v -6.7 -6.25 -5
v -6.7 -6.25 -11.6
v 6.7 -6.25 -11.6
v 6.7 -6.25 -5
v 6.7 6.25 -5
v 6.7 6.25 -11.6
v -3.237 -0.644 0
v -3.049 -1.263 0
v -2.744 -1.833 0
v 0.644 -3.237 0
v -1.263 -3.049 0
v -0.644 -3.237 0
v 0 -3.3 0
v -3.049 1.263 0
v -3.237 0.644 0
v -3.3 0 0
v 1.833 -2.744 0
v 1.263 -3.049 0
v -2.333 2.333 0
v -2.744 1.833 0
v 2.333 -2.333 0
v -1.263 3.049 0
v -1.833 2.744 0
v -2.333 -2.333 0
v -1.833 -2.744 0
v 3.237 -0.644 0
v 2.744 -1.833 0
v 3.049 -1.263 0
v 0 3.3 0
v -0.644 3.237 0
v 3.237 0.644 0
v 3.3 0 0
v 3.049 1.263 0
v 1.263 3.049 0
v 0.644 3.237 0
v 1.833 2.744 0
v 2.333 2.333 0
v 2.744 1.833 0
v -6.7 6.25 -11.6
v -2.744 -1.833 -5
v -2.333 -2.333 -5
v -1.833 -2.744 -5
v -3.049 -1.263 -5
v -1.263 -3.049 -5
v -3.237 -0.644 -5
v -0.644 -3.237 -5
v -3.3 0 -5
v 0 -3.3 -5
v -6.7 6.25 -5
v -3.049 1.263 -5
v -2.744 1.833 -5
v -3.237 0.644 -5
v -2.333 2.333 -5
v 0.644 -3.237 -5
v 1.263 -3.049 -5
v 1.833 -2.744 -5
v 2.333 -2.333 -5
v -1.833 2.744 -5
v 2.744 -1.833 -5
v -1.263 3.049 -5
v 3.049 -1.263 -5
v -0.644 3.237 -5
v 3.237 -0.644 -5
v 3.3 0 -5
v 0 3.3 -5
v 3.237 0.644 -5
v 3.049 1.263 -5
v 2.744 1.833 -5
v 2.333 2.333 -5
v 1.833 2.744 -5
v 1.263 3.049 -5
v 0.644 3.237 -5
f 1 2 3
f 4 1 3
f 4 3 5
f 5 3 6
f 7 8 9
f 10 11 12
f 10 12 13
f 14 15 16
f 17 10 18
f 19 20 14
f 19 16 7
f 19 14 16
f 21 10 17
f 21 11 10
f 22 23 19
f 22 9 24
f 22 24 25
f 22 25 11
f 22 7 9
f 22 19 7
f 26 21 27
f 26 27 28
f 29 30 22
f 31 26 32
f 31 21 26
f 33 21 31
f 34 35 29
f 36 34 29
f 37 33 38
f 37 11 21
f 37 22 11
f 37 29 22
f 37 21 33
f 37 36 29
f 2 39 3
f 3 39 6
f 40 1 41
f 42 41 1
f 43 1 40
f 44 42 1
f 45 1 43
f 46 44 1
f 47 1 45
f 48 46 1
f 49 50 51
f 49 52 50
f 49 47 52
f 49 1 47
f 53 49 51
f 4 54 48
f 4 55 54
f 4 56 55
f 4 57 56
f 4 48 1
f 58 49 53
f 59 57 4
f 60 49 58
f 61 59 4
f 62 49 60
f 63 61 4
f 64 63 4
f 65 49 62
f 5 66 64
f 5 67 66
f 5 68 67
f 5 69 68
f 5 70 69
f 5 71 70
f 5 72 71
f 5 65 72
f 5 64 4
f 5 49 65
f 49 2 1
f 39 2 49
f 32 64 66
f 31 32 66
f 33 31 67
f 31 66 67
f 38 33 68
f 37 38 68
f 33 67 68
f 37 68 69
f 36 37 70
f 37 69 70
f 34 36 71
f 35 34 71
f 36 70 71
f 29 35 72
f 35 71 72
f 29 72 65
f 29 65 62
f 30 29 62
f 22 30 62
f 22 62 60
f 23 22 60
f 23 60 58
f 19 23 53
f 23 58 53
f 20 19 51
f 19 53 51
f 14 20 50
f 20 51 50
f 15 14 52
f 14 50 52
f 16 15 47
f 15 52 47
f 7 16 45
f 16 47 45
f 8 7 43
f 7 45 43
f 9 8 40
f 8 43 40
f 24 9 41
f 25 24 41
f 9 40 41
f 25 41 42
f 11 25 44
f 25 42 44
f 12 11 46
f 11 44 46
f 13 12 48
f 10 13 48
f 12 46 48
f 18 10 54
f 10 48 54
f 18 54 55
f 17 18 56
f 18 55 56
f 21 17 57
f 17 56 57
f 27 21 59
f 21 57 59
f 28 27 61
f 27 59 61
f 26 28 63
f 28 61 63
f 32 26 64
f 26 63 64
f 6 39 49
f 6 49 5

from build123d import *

# Parameters (mm, degrees)
BOX010_W          = 13.4
BOX010_H          = 12.5
BOX010_DEPTH      = 6.6
CYLINDER002_R     = 3.3
CYLINDER002_DEPTH = 5


with BuildPart() as rotary_base:
    # Box010 → Box010 (new body)
    with BuildSketch(Plane(origin=(-6.7, -6.25, -11.6), x_dir=(1, 0, 0), z_dir=(0, 0, 1))):
        with Locations((6.7, 6.25)):
            Rectangle(BOX010_W, BOX010_H)
    extrude(amount=BOX010_DEPTH)


with BuildPart() as fusion020:
    # Cylinder002 → Cylinder002 (new body)
    with BuildSketch(Plane.XY.offset(-5)):
        Circle(CYLINDER002_R)
    extrude(amount=CYLINDER002_DEPTH)

    # Fusion020: union ROTARY_base
    add(rotary_base.part)


solid = fusion020.part
